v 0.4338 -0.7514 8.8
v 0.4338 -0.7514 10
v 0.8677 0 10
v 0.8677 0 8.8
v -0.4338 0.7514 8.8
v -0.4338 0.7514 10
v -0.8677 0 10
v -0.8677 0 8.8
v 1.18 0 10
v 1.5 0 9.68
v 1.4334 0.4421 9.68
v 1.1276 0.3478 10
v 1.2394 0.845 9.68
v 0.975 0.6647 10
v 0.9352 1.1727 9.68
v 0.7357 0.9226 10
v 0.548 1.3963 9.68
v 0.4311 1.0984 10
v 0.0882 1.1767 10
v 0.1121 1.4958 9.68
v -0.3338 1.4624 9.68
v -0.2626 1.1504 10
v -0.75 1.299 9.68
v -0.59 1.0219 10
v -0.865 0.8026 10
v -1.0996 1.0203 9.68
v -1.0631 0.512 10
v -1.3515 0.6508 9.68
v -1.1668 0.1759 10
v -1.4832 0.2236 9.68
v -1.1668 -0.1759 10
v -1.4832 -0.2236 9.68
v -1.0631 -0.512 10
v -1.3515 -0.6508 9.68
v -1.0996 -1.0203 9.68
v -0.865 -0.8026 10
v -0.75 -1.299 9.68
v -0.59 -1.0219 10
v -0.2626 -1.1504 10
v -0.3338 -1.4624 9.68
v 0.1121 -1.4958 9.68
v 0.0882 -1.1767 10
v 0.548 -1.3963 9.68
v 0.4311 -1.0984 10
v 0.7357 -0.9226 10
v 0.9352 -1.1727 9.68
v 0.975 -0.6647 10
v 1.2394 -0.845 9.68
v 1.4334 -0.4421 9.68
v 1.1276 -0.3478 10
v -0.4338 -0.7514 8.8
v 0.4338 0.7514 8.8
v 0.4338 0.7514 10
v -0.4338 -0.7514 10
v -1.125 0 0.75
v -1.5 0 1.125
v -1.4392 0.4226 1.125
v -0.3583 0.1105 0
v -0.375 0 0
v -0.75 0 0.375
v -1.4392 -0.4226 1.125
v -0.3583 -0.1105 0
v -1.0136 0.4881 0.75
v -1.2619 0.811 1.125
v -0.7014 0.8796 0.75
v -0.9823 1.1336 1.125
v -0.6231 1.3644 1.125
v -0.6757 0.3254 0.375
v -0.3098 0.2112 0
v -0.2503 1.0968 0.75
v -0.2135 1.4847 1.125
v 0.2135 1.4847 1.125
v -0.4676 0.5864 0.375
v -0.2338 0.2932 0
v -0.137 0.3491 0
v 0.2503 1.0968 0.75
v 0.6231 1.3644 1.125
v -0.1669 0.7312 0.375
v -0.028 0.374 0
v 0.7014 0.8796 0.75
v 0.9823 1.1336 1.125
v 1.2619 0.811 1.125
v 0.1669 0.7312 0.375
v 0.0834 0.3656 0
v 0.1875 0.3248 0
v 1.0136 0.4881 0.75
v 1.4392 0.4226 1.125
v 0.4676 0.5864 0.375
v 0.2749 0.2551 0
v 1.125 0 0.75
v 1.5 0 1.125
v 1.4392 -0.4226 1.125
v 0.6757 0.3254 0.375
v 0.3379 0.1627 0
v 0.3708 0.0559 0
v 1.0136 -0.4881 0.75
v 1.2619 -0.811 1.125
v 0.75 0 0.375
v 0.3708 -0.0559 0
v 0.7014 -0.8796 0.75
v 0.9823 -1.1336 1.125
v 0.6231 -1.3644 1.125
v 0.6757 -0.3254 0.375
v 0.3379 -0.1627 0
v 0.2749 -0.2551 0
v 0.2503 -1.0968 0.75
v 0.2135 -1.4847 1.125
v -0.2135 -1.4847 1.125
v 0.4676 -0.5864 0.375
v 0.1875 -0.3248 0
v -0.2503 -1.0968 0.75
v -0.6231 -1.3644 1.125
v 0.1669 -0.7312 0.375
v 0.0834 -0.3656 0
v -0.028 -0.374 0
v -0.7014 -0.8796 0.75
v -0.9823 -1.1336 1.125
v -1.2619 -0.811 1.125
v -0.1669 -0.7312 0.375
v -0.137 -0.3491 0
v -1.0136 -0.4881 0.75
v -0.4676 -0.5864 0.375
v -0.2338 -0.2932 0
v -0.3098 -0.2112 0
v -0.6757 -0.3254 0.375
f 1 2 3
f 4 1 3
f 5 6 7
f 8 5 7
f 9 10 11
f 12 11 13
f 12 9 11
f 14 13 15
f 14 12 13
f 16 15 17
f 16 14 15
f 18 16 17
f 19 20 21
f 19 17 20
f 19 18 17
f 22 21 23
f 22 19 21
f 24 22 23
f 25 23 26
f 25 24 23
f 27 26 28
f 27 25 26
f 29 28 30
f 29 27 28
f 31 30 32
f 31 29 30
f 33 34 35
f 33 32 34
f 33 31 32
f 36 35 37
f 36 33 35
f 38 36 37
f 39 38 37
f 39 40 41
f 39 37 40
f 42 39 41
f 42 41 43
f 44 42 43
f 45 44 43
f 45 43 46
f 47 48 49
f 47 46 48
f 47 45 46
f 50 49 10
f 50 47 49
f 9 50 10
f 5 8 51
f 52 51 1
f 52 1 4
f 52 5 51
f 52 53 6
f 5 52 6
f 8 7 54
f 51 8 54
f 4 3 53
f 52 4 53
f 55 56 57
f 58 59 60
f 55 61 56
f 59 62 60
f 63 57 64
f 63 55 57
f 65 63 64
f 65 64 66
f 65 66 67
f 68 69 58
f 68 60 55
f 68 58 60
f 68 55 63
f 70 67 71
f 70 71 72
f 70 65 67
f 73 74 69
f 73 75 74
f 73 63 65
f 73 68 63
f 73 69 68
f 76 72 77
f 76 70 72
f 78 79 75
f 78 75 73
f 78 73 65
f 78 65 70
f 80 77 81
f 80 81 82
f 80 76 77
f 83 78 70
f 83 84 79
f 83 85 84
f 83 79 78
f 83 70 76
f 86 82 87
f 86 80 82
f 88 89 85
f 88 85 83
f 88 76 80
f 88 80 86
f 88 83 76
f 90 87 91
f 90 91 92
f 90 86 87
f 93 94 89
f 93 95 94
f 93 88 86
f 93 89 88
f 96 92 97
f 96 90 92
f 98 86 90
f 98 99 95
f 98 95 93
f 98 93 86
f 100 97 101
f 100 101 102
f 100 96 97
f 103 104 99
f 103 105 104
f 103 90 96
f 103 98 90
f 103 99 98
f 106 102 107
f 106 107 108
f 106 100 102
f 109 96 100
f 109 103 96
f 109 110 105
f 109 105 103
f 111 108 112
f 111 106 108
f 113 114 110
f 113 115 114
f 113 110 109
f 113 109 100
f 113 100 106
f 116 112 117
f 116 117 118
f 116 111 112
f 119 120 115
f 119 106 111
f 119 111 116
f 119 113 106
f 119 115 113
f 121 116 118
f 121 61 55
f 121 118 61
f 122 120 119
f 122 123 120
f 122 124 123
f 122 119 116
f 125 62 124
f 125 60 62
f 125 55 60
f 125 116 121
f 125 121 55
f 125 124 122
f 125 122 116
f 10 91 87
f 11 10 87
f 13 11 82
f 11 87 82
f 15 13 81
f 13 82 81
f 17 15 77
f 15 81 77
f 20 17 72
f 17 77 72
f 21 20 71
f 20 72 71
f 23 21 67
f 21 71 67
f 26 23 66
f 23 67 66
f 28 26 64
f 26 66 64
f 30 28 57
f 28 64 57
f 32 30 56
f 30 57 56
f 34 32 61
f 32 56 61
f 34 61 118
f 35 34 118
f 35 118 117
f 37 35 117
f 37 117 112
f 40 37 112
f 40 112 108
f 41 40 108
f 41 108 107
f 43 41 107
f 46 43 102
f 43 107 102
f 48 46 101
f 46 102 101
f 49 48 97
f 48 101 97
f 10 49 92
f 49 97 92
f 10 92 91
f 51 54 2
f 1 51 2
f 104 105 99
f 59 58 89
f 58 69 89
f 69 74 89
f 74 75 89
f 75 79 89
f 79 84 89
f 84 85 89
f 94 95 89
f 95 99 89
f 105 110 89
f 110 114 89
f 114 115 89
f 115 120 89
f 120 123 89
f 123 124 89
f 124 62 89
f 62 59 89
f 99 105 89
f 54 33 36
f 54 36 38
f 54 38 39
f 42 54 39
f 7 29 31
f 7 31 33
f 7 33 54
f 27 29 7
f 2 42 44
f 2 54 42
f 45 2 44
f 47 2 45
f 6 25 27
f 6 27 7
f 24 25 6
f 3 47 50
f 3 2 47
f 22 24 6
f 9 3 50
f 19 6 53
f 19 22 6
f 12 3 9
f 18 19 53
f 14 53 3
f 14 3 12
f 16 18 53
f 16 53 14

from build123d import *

# Parameters (mm, degrees)
SKETCH1_R           = 1.5
BOSS_EXTRUDE1_DEPTH = 10
CUT_EXTRUDE1_DEPTH  = 1.2
SKETCH3_OUTSIDE_W   = 9.572
SKETCH3_OUTSIDE_H   = 9.572
SKETCH3_OUTSIDE_R   = 1.18
CUT_EXTRUDE2_DEPTH  = 1.2
CUT_EXTRUDE2_DRAFT  = -45
SKETCH4_OUTSIDE_W   = 9.572
SKETCH4_OUTSIDE_H   = 9.572
SKETCH4_OUTSIDE_R   = 0.375
CUT_EXTRUDE3_DEPTH  = 1.2
CUT_EXTRUDE3_DRAFT  = -45


with BuildPart() as part:
    # Sketch1 → Boss-Extrude1 (new body)
    with BuildSketch(Plane.XY):
        Circle(SKETCH1_R)
    extrude(amount=BOSS_EXTRUDE1_DEPTH)

    # Sketch2 → Cut-Extrude1 (cut)
    with BuildSketch(Plane.XY.offset(10)):
        Polygon((0.867651504, 0), (0.433825752, 0.751408244), (-0.433825752, 0.751408244), (-0.867651504, 0), (-0.433825752, -0.751408244), (0.433825752, -0.751408244), align=None)
    extrude(amount=-CUT_EXTRUDE1_DEPTH, mode=Mode.SUBTRACT)


with BuildPart() as cut_extrude2_tool:
    # Sketch3 outside → Cut-Extrude2 (with draft: the straight prism first)
    with BuildSketch(Plane.XY.offset(10)):
        Rectangle(SKETCH3_OUTSIDE_W, SKETCH3_OUTSIDE_H)
        Circle(SKETCH3_OUTSIDE_R, mode=Mode.SUBTRACT)
    extrude(amount=-CUT_EXTRUDE2_DEPTH)
    # Cut-Extrude2: the draft: its side faces are tilted about the plane it starts from
    cut_extrude2_sides = [cut_extrude2_tool.faces().sort_by_distance(p)[0] for p in [
        (0, -4.786, 9.4),
        (4.786, 0, 9.4),
        (0, 4.786, 9.4),
        (-4.786, 0, 9.4),
        (-1.18, 0, 9.4),
    ]]
    draft(cut_extrude2_sides, Plane.XY.offset(10), CUT_EXTRUDE2_DRAFT)


with BuildPart() as part_1:
    add(part.part)

    # Cut-Extrude2: cut by cut_extrude2_tool
    add(cut_extrude2_tool.part, mode=Mode.SUBTRACT)


with BuildPart() as cut_extrude3_tool:
    # Sketch4 outside → Cut-Extrude3 (with draft: the straight prism first)
    with BuildSketch(Plane(origin=(0, 0, 0), x_dir=(-1, 0, 0), z_dir=(0, 0, -1))):
        Rectangle(SKETCH4_OUTSIDE_W, SKETCH4_OUTSIDE_H)
        Circle(SKETCH4_OUTSIDE_R, mode=Mode.SUBTRACT)
    extrude(amount=-CUT_EXTRUDE3_DEPTH)
    # Cut-Extrude3: the draft: its side faces are tilted about the plane it starts from
    cut_extrude3_sides = [cut_extrude3_tool.faces().sort_by_distance(p)[0] for p in [
        (0, -4.786, 0.6),
        (-4.786, 0, 0.6),
        (0, 4.786, 0.6),
        (4.786, 0, 0.6),
        (0.375, 0, 0.6),
    ]]
    draft(cut_extrude3_sides, Plane(origin=(0, 0, 0), x_dir=(-1, 0, 0), z_dir=(0, 0, -1)), CUT_EXTRUDE3_DRAFT)


with BuildPart() as part_2:
    add(part_1.part)

    # Cut-Extrude3: cut by cut_extrude3_tool
    add(cut_extrude3_tool.part, mode=Mode.SUBTRACT)


solid = part_2.part
